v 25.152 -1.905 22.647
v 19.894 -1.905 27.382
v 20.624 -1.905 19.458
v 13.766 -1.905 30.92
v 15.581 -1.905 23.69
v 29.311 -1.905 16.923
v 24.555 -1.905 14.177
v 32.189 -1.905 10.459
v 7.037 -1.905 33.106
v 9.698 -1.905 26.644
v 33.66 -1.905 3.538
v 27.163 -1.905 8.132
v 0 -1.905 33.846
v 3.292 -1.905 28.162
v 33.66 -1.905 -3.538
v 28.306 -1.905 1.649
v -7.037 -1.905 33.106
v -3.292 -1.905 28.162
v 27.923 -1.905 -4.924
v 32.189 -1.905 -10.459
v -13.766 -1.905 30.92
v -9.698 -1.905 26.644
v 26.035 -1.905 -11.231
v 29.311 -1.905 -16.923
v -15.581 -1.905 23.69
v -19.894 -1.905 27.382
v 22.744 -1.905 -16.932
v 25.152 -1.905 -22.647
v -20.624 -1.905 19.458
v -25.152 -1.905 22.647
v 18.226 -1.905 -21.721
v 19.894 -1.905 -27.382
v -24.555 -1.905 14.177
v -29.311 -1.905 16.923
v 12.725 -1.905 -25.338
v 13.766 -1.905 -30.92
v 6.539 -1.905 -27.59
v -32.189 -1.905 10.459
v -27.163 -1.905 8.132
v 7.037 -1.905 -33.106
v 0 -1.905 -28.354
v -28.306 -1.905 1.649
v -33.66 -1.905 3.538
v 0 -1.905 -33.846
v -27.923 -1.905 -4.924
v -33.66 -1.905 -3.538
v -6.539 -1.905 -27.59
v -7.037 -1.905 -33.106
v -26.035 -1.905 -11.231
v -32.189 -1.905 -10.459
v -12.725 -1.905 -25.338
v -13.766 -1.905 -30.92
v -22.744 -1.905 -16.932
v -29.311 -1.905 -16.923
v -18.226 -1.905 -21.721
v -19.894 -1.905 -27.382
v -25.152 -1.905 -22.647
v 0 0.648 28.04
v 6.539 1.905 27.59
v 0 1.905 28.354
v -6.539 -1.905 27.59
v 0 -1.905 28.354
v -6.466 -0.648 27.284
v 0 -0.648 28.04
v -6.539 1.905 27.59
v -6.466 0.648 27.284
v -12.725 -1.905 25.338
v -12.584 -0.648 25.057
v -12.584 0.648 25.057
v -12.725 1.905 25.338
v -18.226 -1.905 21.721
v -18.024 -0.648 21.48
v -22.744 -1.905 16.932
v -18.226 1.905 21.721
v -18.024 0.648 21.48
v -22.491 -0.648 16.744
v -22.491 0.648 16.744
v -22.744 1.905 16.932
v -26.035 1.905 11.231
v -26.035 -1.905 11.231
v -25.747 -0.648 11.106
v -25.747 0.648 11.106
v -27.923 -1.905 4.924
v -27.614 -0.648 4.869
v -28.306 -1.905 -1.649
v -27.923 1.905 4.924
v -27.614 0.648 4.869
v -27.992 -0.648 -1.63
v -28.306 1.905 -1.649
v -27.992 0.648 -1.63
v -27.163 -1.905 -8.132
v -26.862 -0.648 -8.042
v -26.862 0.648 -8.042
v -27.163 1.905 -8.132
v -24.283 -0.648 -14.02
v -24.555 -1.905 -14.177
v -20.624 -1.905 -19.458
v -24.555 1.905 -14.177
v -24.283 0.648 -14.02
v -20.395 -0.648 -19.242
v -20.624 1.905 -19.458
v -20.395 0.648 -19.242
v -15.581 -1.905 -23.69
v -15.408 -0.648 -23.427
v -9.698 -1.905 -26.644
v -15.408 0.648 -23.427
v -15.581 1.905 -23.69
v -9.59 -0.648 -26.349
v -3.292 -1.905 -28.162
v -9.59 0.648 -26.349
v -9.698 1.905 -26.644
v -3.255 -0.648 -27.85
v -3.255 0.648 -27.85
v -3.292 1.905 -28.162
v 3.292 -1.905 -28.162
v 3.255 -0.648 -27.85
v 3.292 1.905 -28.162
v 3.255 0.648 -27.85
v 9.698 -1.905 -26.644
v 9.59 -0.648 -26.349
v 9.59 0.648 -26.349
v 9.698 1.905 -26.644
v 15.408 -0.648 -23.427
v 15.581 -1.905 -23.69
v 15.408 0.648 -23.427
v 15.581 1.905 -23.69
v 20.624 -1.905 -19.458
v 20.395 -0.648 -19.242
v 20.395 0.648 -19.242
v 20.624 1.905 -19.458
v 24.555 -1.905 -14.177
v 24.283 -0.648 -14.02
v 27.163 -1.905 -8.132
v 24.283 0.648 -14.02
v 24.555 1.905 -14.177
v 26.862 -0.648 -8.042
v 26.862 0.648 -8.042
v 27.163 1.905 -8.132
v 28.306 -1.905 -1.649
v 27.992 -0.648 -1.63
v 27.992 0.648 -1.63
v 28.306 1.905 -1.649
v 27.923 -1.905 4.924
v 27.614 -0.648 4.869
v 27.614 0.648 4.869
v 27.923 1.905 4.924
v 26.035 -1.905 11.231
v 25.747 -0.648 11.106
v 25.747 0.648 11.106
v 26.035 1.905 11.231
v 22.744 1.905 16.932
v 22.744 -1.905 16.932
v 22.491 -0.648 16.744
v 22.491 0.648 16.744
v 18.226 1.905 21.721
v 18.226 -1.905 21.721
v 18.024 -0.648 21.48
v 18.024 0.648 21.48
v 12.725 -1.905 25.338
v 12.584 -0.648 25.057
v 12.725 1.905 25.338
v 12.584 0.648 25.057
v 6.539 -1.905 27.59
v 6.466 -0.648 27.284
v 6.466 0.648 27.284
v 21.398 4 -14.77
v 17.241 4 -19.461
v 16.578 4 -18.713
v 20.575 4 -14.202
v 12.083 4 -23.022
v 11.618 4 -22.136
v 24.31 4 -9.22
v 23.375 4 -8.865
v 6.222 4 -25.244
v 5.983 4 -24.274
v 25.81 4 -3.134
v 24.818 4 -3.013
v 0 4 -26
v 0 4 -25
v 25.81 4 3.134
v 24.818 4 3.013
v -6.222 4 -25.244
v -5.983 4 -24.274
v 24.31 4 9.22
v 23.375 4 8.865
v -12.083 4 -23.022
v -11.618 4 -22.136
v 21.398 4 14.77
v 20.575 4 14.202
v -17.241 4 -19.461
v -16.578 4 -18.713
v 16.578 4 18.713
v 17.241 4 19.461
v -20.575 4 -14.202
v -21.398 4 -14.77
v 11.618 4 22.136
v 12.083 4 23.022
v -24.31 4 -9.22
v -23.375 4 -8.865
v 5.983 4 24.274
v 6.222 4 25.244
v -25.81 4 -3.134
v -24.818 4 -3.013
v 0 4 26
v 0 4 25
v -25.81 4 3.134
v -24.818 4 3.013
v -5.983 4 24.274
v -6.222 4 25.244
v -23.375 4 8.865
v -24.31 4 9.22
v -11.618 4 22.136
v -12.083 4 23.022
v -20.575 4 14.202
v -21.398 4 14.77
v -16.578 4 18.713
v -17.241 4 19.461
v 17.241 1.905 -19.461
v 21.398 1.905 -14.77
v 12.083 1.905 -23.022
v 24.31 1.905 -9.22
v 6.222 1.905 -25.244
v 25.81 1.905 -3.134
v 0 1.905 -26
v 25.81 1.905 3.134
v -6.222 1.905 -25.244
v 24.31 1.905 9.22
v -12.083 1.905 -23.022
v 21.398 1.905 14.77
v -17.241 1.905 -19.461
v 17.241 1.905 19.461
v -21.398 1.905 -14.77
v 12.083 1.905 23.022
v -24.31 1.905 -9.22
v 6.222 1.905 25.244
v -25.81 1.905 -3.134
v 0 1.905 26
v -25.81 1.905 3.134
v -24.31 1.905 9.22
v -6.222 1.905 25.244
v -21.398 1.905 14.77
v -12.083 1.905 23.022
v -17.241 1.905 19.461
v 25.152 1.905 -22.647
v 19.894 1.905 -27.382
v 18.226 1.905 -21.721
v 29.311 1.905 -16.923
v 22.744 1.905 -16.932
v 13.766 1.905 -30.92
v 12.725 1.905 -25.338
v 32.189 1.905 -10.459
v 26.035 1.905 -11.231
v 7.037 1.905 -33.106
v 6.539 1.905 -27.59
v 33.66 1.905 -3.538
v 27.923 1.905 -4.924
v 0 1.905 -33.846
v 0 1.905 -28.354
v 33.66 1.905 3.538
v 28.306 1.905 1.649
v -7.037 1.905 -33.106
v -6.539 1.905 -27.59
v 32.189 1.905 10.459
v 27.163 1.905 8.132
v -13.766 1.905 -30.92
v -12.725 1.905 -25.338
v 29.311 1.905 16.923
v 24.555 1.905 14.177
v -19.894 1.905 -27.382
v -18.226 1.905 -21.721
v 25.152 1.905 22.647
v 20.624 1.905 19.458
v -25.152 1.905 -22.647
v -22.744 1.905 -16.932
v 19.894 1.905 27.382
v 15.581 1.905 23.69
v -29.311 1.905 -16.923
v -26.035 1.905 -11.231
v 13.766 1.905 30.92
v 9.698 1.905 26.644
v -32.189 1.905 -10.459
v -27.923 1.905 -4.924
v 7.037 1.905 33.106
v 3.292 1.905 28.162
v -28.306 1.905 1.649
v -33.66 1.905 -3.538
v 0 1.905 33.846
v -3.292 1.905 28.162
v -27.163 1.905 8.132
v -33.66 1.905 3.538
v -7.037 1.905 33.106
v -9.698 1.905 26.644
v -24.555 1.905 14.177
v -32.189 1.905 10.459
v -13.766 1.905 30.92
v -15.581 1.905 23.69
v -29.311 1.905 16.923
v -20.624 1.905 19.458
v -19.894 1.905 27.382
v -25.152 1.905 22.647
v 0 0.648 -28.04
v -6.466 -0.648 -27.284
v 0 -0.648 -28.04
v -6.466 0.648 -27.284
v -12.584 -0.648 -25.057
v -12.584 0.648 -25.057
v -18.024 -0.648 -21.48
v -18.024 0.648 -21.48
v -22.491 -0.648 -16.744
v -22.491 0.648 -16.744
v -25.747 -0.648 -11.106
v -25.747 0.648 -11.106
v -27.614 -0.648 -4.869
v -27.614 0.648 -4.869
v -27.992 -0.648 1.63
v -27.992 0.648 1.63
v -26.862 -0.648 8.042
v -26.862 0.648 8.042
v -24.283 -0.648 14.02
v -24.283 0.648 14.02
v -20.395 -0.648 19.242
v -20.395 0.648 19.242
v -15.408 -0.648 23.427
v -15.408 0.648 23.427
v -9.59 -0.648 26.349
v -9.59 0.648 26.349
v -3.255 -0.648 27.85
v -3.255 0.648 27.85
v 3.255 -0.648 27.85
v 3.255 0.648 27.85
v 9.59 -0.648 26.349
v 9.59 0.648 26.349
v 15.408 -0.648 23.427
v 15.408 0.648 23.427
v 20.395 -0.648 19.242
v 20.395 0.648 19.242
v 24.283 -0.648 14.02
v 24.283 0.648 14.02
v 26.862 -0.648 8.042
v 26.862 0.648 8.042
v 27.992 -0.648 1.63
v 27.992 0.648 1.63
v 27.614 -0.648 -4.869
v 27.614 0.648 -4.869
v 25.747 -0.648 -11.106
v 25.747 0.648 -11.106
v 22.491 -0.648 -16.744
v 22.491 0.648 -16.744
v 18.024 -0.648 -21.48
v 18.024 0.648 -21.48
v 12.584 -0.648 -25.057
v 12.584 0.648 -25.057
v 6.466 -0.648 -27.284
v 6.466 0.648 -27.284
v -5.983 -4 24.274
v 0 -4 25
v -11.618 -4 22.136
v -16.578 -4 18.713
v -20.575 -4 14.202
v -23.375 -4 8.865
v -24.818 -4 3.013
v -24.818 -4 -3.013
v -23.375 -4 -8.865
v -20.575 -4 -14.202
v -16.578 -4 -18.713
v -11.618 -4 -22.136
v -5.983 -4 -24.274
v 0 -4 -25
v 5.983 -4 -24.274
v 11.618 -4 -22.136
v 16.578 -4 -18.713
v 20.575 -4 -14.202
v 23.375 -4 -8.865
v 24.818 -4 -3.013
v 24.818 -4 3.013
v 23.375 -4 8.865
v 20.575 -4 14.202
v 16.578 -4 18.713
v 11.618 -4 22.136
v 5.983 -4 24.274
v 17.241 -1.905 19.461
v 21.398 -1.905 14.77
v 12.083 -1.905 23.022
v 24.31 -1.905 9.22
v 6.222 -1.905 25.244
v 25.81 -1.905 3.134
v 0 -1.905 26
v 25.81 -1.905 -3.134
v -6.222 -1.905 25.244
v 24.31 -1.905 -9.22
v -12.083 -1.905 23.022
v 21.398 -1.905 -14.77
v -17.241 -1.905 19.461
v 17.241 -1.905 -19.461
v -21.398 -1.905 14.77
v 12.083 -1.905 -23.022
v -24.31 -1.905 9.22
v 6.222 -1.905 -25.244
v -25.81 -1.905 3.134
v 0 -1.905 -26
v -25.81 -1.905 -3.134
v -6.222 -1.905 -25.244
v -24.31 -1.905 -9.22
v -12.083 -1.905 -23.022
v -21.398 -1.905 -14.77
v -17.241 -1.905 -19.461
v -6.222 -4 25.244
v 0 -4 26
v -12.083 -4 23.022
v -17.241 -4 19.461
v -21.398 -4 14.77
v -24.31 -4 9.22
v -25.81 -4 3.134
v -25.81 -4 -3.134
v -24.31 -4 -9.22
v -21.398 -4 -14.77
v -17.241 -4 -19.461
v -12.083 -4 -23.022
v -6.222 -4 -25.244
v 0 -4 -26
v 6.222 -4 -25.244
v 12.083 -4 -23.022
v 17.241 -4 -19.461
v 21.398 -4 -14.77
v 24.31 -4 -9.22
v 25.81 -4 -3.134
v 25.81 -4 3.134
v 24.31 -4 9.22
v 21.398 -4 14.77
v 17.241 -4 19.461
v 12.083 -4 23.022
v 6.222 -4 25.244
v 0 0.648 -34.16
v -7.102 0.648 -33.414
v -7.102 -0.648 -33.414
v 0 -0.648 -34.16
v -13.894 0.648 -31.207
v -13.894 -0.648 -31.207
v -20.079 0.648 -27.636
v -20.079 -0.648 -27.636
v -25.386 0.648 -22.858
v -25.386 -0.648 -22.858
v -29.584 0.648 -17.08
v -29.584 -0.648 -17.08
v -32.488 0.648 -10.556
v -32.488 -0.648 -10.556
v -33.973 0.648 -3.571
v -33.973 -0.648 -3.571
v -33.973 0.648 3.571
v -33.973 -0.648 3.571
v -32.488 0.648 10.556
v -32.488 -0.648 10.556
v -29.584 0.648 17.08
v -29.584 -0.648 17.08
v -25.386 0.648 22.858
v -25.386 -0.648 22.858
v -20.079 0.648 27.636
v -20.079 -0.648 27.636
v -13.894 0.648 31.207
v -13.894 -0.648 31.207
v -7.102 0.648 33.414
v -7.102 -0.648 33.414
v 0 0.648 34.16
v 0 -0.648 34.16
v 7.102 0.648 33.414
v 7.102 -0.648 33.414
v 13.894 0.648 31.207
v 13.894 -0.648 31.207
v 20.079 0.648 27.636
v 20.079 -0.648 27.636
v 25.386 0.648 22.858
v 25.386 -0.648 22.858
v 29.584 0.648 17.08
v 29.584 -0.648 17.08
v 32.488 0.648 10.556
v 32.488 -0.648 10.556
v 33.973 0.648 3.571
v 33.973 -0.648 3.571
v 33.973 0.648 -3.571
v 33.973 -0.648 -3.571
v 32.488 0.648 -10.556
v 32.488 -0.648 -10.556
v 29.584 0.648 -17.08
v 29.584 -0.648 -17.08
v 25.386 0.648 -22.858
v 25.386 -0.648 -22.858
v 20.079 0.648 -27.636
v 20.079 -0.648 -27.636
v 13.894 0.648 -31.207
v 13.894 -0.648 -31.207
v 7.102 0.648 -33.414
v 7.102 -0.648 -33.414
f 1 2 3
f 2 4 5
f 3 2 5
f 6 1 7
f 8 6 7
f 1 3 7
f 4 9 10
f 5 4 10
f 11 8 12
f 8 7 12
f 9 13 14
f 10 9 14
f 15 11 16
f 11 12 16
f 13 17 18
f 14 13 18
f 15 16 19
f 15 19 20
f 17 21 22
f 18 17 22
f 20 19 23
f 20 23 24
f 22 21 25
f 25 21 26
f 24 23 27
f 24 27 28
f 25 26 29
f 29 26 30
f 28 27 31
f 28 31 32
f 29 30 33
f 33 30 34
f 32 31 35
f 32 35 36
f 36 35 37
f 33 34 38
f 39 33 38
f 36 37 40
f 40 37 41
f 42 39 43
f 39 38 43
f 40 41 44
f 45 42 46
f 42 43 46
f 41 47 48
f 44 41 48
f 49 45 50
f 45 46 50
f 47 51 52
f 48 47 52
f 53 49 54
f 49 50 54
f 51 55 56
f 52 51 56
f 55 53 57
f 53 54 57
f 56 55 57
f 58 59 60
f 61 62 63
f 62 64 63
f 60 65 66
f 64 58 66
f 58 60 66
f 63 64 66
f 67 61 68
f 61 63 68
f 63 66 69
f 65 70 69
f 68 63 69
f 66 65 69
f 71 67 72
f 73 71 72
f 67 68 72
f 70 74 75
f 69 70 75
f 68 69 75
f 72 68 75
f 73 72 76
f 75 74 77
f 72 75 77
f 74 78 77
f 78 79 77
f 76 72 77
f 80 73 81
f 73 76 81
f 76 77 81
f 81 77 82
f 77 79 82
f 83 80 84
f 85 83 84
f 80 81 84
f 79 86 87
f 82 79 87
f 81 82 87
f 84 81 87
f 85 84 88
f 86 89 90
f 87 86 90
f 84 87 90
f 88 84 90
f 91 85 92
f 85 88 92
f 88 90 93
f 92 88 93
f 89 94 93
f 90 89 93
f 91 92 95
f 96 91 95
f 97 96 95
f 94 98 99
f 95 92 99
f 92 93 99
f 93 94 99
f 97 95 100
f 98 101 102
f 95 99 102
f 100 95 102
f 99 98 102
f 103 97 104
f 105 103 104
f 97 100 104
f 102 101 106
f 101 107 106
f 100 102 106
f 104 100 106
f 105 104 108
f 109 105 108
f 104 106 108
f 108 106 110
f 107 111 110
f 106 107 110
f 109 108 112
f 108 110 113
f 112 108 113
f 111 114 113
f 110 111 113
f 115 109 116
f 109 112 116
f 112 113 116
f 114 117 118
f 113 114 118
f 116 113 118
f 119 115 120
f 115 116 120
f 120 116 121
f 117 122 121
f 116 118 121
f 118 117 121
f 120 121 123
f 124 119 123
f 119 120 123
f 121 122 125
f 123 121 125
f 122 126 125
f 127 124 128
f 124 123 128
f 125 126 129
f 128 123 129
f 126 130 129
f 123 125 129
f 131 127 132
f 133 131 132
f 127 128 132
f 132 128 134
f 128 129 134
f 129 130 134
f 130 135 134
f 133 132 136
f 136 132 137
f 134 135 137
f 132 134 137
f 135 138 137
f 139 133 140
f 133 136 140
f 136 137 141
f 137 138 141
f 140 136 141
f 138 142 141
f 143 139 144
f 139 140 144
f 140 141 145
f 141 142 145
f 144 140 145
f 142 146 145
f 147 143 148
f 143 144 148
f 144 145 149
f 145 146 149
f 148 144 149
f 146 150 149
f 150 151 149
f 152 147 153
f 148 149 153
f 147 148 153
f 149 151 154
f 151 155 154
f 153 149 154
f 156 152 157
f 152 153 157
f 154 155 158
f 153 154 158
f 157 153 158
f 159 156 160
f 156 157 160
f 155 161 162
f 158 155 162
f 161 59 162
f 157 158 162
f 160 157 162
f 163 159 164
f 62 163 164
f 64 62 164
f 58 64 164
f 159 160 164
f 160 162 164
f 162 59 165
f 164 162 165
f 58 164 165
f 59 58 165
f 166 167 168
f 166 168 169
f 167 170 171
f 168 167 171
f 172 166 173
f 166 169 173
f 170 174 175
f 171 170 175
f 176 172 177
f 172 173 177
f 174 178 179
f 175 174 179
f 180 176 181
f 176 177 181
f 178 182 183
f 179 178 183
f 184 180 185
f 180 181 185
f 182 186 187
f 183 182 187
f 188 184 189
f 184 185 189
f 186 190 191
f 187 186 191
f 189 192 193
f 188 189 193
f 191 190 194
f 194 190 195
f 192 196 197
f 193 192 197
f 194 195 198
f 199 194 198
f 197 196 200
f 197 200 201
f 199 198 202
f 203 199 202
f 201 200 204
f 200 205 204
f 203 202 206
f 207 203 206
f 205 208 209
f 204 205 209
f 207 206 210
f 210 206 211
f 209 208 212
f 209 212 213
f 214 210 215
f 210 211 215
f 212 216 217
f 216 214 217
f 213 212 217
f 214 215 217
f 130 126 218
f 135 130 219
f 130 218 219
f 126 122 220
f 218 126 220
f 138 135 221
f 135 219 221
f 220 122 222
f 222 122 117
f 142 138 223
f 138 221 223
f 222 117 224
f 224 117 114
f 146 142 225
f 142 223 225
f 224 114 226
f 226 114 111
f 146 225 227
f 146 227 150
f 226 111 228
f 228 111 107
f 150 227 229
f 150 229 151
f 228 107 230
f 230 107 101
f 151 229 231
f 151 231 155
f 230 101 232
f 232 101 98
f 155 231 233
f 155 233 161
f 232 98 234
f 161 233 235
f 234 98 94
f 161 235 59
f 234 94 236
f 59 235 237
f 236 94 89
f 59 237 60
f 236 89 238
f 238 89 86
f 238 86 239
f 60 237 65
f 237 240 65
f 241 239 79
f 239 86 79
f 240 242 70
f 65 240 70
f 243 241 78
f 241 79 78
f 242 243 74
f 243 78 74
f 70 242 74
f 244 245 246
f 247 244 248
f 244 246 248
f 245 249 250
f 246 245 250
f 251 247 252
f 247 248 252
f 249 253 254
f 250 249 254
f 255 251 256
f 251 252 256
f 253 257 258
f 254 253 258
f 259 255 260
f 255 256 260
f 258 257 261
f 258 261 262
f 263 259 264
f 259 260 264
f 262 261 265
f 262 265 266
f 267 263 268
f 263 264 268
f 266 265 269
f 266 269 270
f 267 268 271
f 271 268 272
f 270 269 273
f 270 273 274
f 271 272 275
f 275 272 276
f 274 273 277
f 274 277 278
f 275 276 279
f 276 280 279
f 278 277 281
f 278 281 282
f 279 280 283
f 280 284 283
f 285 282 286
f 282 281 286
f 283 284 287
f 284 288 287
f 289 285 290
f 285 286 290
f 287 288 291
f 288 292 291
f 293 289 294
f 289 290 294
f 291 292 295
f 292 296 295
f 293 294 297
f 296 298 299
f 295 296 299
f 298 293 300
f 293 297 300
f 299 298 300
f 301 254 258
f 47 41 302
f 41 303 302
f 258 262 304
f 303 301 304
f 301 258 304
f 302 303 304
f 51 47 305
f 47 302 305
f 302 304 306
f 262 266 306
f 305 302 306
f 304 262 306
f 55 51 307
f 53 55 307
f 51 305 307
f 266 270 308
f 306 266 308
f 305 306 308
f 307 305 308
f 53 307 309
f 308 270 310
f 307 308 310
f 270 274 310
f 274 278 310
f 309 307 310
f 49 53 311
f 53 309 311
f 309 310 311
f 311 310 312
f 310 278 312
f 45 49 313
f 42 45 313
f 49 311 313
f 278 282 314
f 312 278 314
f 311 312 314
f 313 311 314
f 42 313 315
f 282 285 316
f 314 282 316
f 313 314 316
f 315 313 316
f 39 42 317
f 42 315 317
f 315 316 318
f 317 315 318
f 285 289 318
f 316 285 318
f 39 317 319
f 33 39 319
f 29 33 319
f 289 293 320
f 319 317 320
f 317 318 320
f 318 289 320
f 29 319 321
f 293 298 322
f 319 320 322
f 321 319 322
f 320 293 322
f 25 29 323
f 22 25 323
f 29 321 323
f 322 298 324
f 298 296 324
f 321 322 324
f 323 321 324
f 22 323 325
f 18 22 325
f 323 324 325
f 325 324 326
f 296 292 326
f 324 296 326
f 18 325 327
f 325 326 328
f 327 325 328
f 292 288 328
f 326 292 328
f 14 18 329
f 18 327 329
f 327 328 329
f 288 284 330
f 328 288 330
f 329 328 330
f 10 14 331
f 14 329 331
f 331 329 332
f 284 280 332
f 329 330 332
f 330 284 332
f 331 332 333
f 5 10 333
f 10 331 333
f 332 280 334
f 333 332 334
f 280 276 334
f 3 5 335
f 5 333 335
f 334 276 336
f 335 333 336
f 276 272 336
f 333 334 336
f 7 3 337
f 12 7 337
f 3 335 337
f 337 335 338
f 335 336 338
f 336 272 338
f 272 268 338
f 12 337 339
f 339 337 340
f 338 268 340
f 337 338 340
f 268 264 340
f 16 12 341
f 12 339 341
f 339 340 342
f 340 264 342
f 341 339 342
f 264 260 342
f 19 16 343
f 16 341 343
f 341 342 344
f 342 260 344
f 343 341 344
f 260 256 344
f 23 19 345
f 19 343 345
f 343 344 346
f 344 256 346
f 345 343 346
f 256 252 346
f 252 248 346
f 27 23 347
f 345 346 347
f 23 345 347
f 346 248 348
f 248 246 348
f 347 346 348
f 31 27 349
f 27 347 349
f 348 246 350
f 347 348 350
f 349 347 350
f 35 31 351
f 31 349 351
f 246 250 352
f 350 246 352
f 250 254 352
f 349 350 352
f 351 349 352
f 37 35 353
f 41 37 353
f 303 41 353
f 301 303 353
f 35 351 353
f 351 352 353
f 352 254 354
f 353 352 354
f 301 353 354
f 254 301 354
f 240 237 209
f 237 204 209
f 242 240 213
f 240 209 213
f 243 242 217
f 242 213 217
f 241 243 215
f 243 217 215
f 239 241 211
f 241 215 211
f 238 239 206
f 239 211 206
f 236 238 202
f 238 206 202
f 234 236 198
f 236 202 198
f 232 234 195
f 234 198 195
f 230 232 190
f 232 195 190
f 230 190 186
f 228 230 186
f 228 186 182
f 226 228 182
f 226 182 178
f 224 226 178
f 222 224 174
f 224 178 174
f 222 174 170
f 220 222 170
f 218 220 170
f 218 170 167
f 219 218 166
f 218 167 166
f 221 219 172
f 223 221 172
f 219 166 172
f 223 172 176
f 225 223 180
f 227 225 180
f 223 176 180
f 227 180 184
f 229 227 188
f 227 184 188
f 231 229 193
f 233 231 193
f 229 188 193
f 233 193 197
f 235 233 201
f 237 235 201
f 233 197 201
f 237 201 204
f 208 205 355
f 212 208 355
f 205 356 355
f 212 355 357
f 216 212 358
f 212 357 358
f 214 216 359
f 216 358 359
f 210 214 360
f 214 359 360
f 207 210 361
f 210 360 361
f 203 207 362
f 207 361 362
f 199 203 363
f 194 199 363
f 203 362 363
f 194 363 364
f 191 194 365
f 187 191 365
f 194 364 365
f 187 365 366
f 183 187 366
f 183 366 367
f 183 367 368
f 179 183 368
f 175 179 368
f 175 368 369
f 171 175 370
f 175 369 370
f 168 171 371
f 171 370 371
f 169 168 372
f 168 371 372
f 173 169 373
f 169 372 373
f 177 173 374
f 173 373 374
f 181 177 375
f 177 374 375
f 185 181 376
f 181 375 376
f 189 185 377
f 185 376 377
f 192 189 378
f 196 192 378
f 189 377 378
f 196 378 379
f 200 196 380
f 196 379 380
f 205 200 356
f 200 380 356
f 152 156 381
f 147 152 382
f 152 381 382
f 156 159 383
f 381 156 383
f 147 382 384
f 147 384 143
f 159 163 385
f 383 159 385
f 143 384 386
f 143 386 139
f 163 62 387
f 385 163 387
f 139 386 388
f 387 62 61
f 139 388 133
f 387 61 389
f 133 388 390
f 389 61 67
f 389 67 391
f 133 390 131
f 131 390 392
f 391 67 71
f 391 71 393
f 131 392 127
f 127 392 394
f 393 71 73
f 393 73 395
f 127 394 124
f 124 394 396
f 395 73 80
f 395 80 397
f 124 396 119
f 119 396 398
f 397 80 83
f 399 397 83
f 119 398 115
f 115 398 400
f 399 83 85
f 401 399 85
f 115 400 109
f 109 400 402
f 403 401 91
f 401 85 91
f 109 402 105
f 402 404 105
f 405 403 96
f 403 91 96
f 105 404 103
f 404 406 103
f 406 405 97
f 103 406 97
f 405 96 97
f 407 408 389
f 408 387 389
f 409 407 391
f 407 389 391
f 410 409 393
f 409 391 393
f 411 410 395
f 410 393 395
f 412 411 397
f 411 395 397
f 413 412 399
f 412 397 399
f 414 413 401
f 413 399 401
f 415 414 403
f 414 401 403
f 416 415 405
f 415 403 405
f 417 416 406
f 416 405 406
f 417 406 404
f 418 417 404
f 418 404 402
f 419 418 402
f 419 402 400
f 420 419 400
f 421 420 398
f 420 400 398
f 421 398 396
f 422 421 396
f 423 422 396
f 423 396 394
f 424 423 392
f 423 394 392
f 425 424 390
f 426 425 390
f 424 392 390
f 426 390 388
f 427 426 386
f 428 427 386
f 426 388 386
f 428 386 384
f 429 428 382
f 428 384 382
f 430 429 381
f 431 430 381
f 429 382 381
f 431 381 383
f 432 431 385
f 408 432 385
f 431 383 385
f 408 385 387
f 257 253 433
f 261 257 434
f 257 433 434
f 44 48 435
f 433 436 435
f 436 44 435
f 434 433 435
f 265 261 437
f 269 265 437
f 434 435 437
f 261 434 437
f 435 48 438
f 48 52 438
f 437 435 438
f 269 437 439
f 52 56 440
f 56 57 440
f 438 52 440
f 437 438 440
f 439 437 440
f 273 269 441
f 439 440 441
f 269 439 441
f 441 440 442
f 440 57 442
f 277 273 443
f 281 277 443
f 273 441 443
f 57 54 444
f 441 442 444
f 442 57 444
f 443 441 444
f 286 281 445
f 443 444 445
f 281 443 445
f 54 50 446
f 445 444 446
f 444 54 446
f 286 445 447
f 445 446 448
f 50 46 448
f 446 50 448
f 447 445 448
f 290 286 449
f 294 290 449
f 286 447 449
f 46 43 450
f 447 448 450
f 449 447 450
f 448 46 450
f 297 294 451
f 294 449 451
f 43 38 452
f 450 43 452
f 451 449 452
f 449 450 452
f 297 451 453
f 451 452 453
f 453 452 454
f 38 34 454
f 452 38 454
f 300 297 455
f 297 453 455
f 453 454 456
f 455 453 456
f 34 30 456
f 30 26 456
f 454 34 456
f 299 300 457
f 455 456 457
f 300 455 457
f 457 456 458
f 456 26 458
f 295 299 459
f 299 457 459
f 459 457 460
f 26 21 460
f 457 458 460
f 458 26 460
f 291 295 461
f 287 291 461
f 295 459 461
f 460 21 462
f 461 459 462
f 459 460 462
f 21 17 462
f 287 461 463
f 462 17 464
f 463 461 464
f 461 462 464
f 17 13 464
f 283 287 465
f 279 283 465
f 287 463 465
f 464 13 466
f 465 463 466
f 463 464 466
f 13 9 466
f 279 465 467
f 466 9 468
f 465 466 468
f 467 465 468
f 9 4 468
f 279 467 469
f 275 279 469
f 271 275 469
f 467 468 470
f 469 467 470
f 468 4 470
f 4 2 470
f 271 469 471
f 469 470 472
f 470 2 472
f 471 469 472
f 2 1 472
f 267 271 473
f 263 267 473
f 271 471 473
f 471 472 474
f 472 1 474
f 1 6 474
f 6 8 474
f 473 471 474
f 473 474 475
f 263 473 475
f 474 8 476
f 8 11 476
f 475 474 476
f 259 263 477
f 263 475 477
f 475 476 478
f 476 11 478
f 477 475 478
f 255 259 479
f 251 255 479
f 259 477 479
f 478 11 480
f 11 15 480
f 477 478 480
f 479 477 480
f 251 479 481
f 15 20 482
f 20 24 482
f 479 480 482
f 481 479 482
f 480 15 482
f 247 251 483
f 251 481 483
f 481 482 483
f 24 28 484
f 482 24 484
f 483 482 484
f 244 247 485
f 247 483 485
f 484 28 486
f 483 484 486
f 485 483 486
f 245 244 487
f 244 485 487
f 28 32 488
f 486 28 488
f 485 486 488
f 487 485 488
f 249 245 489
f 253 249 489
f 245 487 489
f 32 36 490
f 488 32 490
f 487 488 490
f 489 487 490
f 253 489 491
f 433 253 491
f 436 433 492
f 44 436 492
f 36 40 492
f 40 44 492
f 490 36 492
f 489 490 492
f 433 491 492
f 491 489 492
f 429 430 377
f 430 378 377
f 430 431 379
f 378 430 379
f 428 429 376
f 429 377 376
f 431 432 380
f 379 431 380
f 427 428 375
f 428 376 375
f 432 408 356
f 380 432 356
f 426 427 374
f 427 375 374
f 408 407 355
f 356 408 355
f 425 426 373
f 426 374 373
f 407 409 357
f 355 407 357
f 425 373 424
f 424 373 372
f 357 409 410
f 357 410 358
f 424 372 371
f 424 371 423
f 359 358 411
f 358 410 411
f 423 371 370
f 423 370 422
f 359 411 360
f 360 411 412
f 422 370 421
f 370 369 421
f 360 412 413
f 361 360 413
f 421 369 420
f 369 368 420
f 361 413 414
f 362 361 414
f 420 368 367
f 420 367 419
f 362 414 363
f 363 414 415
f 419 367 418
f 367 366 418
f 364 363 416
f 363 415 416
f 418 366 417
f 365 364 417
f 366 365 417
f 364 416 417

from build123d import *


with BuildPart() as part:
    # Sketch1 → Revolve1 (revolve)
    with BuildSketch(Plane.XY):
        with BuildLine():
            Line((25, 4), (25, -4))
            Line((25, -4), (26, -4))
            Line((26, -4), (26, -1.905))
            Line((26, -1.905), (28.354196223, -1.905))
            ThreePointArc((28.354196223, -1.905), (28, 0), (28.354196223, 1.905))
            Line((28.354196223, 1.905), (26, 1.905))
            Line((26, 1.905), (26, 4))
            Line((26, 4), (25, 4))
        make_face()
    revolve(axis=Axis((0, 4, 0), (0, -1, 0)))


with BuildPart() as body_2:
    # Sketch2 → Revolve2 (revolve)
    with BuildSketch(Plane.XY):
        with BuildLine():
            Line((28.354196223, 1.905), (33.845803777, 1.905))
            ThreePointArc((33.845803777, 1.905), (34.2, 0), (33.845803777, -1.905))
            Line((33.845803777, -1.905), (28.354196223, -1.905))
            ThreePointArc((28.354196223, -1.905), (28, 0), (28.354196223, 1.905))
        make_face()
    revolve(axis=Axis((0, -4, 0), (0, 1, 0)))


solid = Compound([part.part, body_2.part])
